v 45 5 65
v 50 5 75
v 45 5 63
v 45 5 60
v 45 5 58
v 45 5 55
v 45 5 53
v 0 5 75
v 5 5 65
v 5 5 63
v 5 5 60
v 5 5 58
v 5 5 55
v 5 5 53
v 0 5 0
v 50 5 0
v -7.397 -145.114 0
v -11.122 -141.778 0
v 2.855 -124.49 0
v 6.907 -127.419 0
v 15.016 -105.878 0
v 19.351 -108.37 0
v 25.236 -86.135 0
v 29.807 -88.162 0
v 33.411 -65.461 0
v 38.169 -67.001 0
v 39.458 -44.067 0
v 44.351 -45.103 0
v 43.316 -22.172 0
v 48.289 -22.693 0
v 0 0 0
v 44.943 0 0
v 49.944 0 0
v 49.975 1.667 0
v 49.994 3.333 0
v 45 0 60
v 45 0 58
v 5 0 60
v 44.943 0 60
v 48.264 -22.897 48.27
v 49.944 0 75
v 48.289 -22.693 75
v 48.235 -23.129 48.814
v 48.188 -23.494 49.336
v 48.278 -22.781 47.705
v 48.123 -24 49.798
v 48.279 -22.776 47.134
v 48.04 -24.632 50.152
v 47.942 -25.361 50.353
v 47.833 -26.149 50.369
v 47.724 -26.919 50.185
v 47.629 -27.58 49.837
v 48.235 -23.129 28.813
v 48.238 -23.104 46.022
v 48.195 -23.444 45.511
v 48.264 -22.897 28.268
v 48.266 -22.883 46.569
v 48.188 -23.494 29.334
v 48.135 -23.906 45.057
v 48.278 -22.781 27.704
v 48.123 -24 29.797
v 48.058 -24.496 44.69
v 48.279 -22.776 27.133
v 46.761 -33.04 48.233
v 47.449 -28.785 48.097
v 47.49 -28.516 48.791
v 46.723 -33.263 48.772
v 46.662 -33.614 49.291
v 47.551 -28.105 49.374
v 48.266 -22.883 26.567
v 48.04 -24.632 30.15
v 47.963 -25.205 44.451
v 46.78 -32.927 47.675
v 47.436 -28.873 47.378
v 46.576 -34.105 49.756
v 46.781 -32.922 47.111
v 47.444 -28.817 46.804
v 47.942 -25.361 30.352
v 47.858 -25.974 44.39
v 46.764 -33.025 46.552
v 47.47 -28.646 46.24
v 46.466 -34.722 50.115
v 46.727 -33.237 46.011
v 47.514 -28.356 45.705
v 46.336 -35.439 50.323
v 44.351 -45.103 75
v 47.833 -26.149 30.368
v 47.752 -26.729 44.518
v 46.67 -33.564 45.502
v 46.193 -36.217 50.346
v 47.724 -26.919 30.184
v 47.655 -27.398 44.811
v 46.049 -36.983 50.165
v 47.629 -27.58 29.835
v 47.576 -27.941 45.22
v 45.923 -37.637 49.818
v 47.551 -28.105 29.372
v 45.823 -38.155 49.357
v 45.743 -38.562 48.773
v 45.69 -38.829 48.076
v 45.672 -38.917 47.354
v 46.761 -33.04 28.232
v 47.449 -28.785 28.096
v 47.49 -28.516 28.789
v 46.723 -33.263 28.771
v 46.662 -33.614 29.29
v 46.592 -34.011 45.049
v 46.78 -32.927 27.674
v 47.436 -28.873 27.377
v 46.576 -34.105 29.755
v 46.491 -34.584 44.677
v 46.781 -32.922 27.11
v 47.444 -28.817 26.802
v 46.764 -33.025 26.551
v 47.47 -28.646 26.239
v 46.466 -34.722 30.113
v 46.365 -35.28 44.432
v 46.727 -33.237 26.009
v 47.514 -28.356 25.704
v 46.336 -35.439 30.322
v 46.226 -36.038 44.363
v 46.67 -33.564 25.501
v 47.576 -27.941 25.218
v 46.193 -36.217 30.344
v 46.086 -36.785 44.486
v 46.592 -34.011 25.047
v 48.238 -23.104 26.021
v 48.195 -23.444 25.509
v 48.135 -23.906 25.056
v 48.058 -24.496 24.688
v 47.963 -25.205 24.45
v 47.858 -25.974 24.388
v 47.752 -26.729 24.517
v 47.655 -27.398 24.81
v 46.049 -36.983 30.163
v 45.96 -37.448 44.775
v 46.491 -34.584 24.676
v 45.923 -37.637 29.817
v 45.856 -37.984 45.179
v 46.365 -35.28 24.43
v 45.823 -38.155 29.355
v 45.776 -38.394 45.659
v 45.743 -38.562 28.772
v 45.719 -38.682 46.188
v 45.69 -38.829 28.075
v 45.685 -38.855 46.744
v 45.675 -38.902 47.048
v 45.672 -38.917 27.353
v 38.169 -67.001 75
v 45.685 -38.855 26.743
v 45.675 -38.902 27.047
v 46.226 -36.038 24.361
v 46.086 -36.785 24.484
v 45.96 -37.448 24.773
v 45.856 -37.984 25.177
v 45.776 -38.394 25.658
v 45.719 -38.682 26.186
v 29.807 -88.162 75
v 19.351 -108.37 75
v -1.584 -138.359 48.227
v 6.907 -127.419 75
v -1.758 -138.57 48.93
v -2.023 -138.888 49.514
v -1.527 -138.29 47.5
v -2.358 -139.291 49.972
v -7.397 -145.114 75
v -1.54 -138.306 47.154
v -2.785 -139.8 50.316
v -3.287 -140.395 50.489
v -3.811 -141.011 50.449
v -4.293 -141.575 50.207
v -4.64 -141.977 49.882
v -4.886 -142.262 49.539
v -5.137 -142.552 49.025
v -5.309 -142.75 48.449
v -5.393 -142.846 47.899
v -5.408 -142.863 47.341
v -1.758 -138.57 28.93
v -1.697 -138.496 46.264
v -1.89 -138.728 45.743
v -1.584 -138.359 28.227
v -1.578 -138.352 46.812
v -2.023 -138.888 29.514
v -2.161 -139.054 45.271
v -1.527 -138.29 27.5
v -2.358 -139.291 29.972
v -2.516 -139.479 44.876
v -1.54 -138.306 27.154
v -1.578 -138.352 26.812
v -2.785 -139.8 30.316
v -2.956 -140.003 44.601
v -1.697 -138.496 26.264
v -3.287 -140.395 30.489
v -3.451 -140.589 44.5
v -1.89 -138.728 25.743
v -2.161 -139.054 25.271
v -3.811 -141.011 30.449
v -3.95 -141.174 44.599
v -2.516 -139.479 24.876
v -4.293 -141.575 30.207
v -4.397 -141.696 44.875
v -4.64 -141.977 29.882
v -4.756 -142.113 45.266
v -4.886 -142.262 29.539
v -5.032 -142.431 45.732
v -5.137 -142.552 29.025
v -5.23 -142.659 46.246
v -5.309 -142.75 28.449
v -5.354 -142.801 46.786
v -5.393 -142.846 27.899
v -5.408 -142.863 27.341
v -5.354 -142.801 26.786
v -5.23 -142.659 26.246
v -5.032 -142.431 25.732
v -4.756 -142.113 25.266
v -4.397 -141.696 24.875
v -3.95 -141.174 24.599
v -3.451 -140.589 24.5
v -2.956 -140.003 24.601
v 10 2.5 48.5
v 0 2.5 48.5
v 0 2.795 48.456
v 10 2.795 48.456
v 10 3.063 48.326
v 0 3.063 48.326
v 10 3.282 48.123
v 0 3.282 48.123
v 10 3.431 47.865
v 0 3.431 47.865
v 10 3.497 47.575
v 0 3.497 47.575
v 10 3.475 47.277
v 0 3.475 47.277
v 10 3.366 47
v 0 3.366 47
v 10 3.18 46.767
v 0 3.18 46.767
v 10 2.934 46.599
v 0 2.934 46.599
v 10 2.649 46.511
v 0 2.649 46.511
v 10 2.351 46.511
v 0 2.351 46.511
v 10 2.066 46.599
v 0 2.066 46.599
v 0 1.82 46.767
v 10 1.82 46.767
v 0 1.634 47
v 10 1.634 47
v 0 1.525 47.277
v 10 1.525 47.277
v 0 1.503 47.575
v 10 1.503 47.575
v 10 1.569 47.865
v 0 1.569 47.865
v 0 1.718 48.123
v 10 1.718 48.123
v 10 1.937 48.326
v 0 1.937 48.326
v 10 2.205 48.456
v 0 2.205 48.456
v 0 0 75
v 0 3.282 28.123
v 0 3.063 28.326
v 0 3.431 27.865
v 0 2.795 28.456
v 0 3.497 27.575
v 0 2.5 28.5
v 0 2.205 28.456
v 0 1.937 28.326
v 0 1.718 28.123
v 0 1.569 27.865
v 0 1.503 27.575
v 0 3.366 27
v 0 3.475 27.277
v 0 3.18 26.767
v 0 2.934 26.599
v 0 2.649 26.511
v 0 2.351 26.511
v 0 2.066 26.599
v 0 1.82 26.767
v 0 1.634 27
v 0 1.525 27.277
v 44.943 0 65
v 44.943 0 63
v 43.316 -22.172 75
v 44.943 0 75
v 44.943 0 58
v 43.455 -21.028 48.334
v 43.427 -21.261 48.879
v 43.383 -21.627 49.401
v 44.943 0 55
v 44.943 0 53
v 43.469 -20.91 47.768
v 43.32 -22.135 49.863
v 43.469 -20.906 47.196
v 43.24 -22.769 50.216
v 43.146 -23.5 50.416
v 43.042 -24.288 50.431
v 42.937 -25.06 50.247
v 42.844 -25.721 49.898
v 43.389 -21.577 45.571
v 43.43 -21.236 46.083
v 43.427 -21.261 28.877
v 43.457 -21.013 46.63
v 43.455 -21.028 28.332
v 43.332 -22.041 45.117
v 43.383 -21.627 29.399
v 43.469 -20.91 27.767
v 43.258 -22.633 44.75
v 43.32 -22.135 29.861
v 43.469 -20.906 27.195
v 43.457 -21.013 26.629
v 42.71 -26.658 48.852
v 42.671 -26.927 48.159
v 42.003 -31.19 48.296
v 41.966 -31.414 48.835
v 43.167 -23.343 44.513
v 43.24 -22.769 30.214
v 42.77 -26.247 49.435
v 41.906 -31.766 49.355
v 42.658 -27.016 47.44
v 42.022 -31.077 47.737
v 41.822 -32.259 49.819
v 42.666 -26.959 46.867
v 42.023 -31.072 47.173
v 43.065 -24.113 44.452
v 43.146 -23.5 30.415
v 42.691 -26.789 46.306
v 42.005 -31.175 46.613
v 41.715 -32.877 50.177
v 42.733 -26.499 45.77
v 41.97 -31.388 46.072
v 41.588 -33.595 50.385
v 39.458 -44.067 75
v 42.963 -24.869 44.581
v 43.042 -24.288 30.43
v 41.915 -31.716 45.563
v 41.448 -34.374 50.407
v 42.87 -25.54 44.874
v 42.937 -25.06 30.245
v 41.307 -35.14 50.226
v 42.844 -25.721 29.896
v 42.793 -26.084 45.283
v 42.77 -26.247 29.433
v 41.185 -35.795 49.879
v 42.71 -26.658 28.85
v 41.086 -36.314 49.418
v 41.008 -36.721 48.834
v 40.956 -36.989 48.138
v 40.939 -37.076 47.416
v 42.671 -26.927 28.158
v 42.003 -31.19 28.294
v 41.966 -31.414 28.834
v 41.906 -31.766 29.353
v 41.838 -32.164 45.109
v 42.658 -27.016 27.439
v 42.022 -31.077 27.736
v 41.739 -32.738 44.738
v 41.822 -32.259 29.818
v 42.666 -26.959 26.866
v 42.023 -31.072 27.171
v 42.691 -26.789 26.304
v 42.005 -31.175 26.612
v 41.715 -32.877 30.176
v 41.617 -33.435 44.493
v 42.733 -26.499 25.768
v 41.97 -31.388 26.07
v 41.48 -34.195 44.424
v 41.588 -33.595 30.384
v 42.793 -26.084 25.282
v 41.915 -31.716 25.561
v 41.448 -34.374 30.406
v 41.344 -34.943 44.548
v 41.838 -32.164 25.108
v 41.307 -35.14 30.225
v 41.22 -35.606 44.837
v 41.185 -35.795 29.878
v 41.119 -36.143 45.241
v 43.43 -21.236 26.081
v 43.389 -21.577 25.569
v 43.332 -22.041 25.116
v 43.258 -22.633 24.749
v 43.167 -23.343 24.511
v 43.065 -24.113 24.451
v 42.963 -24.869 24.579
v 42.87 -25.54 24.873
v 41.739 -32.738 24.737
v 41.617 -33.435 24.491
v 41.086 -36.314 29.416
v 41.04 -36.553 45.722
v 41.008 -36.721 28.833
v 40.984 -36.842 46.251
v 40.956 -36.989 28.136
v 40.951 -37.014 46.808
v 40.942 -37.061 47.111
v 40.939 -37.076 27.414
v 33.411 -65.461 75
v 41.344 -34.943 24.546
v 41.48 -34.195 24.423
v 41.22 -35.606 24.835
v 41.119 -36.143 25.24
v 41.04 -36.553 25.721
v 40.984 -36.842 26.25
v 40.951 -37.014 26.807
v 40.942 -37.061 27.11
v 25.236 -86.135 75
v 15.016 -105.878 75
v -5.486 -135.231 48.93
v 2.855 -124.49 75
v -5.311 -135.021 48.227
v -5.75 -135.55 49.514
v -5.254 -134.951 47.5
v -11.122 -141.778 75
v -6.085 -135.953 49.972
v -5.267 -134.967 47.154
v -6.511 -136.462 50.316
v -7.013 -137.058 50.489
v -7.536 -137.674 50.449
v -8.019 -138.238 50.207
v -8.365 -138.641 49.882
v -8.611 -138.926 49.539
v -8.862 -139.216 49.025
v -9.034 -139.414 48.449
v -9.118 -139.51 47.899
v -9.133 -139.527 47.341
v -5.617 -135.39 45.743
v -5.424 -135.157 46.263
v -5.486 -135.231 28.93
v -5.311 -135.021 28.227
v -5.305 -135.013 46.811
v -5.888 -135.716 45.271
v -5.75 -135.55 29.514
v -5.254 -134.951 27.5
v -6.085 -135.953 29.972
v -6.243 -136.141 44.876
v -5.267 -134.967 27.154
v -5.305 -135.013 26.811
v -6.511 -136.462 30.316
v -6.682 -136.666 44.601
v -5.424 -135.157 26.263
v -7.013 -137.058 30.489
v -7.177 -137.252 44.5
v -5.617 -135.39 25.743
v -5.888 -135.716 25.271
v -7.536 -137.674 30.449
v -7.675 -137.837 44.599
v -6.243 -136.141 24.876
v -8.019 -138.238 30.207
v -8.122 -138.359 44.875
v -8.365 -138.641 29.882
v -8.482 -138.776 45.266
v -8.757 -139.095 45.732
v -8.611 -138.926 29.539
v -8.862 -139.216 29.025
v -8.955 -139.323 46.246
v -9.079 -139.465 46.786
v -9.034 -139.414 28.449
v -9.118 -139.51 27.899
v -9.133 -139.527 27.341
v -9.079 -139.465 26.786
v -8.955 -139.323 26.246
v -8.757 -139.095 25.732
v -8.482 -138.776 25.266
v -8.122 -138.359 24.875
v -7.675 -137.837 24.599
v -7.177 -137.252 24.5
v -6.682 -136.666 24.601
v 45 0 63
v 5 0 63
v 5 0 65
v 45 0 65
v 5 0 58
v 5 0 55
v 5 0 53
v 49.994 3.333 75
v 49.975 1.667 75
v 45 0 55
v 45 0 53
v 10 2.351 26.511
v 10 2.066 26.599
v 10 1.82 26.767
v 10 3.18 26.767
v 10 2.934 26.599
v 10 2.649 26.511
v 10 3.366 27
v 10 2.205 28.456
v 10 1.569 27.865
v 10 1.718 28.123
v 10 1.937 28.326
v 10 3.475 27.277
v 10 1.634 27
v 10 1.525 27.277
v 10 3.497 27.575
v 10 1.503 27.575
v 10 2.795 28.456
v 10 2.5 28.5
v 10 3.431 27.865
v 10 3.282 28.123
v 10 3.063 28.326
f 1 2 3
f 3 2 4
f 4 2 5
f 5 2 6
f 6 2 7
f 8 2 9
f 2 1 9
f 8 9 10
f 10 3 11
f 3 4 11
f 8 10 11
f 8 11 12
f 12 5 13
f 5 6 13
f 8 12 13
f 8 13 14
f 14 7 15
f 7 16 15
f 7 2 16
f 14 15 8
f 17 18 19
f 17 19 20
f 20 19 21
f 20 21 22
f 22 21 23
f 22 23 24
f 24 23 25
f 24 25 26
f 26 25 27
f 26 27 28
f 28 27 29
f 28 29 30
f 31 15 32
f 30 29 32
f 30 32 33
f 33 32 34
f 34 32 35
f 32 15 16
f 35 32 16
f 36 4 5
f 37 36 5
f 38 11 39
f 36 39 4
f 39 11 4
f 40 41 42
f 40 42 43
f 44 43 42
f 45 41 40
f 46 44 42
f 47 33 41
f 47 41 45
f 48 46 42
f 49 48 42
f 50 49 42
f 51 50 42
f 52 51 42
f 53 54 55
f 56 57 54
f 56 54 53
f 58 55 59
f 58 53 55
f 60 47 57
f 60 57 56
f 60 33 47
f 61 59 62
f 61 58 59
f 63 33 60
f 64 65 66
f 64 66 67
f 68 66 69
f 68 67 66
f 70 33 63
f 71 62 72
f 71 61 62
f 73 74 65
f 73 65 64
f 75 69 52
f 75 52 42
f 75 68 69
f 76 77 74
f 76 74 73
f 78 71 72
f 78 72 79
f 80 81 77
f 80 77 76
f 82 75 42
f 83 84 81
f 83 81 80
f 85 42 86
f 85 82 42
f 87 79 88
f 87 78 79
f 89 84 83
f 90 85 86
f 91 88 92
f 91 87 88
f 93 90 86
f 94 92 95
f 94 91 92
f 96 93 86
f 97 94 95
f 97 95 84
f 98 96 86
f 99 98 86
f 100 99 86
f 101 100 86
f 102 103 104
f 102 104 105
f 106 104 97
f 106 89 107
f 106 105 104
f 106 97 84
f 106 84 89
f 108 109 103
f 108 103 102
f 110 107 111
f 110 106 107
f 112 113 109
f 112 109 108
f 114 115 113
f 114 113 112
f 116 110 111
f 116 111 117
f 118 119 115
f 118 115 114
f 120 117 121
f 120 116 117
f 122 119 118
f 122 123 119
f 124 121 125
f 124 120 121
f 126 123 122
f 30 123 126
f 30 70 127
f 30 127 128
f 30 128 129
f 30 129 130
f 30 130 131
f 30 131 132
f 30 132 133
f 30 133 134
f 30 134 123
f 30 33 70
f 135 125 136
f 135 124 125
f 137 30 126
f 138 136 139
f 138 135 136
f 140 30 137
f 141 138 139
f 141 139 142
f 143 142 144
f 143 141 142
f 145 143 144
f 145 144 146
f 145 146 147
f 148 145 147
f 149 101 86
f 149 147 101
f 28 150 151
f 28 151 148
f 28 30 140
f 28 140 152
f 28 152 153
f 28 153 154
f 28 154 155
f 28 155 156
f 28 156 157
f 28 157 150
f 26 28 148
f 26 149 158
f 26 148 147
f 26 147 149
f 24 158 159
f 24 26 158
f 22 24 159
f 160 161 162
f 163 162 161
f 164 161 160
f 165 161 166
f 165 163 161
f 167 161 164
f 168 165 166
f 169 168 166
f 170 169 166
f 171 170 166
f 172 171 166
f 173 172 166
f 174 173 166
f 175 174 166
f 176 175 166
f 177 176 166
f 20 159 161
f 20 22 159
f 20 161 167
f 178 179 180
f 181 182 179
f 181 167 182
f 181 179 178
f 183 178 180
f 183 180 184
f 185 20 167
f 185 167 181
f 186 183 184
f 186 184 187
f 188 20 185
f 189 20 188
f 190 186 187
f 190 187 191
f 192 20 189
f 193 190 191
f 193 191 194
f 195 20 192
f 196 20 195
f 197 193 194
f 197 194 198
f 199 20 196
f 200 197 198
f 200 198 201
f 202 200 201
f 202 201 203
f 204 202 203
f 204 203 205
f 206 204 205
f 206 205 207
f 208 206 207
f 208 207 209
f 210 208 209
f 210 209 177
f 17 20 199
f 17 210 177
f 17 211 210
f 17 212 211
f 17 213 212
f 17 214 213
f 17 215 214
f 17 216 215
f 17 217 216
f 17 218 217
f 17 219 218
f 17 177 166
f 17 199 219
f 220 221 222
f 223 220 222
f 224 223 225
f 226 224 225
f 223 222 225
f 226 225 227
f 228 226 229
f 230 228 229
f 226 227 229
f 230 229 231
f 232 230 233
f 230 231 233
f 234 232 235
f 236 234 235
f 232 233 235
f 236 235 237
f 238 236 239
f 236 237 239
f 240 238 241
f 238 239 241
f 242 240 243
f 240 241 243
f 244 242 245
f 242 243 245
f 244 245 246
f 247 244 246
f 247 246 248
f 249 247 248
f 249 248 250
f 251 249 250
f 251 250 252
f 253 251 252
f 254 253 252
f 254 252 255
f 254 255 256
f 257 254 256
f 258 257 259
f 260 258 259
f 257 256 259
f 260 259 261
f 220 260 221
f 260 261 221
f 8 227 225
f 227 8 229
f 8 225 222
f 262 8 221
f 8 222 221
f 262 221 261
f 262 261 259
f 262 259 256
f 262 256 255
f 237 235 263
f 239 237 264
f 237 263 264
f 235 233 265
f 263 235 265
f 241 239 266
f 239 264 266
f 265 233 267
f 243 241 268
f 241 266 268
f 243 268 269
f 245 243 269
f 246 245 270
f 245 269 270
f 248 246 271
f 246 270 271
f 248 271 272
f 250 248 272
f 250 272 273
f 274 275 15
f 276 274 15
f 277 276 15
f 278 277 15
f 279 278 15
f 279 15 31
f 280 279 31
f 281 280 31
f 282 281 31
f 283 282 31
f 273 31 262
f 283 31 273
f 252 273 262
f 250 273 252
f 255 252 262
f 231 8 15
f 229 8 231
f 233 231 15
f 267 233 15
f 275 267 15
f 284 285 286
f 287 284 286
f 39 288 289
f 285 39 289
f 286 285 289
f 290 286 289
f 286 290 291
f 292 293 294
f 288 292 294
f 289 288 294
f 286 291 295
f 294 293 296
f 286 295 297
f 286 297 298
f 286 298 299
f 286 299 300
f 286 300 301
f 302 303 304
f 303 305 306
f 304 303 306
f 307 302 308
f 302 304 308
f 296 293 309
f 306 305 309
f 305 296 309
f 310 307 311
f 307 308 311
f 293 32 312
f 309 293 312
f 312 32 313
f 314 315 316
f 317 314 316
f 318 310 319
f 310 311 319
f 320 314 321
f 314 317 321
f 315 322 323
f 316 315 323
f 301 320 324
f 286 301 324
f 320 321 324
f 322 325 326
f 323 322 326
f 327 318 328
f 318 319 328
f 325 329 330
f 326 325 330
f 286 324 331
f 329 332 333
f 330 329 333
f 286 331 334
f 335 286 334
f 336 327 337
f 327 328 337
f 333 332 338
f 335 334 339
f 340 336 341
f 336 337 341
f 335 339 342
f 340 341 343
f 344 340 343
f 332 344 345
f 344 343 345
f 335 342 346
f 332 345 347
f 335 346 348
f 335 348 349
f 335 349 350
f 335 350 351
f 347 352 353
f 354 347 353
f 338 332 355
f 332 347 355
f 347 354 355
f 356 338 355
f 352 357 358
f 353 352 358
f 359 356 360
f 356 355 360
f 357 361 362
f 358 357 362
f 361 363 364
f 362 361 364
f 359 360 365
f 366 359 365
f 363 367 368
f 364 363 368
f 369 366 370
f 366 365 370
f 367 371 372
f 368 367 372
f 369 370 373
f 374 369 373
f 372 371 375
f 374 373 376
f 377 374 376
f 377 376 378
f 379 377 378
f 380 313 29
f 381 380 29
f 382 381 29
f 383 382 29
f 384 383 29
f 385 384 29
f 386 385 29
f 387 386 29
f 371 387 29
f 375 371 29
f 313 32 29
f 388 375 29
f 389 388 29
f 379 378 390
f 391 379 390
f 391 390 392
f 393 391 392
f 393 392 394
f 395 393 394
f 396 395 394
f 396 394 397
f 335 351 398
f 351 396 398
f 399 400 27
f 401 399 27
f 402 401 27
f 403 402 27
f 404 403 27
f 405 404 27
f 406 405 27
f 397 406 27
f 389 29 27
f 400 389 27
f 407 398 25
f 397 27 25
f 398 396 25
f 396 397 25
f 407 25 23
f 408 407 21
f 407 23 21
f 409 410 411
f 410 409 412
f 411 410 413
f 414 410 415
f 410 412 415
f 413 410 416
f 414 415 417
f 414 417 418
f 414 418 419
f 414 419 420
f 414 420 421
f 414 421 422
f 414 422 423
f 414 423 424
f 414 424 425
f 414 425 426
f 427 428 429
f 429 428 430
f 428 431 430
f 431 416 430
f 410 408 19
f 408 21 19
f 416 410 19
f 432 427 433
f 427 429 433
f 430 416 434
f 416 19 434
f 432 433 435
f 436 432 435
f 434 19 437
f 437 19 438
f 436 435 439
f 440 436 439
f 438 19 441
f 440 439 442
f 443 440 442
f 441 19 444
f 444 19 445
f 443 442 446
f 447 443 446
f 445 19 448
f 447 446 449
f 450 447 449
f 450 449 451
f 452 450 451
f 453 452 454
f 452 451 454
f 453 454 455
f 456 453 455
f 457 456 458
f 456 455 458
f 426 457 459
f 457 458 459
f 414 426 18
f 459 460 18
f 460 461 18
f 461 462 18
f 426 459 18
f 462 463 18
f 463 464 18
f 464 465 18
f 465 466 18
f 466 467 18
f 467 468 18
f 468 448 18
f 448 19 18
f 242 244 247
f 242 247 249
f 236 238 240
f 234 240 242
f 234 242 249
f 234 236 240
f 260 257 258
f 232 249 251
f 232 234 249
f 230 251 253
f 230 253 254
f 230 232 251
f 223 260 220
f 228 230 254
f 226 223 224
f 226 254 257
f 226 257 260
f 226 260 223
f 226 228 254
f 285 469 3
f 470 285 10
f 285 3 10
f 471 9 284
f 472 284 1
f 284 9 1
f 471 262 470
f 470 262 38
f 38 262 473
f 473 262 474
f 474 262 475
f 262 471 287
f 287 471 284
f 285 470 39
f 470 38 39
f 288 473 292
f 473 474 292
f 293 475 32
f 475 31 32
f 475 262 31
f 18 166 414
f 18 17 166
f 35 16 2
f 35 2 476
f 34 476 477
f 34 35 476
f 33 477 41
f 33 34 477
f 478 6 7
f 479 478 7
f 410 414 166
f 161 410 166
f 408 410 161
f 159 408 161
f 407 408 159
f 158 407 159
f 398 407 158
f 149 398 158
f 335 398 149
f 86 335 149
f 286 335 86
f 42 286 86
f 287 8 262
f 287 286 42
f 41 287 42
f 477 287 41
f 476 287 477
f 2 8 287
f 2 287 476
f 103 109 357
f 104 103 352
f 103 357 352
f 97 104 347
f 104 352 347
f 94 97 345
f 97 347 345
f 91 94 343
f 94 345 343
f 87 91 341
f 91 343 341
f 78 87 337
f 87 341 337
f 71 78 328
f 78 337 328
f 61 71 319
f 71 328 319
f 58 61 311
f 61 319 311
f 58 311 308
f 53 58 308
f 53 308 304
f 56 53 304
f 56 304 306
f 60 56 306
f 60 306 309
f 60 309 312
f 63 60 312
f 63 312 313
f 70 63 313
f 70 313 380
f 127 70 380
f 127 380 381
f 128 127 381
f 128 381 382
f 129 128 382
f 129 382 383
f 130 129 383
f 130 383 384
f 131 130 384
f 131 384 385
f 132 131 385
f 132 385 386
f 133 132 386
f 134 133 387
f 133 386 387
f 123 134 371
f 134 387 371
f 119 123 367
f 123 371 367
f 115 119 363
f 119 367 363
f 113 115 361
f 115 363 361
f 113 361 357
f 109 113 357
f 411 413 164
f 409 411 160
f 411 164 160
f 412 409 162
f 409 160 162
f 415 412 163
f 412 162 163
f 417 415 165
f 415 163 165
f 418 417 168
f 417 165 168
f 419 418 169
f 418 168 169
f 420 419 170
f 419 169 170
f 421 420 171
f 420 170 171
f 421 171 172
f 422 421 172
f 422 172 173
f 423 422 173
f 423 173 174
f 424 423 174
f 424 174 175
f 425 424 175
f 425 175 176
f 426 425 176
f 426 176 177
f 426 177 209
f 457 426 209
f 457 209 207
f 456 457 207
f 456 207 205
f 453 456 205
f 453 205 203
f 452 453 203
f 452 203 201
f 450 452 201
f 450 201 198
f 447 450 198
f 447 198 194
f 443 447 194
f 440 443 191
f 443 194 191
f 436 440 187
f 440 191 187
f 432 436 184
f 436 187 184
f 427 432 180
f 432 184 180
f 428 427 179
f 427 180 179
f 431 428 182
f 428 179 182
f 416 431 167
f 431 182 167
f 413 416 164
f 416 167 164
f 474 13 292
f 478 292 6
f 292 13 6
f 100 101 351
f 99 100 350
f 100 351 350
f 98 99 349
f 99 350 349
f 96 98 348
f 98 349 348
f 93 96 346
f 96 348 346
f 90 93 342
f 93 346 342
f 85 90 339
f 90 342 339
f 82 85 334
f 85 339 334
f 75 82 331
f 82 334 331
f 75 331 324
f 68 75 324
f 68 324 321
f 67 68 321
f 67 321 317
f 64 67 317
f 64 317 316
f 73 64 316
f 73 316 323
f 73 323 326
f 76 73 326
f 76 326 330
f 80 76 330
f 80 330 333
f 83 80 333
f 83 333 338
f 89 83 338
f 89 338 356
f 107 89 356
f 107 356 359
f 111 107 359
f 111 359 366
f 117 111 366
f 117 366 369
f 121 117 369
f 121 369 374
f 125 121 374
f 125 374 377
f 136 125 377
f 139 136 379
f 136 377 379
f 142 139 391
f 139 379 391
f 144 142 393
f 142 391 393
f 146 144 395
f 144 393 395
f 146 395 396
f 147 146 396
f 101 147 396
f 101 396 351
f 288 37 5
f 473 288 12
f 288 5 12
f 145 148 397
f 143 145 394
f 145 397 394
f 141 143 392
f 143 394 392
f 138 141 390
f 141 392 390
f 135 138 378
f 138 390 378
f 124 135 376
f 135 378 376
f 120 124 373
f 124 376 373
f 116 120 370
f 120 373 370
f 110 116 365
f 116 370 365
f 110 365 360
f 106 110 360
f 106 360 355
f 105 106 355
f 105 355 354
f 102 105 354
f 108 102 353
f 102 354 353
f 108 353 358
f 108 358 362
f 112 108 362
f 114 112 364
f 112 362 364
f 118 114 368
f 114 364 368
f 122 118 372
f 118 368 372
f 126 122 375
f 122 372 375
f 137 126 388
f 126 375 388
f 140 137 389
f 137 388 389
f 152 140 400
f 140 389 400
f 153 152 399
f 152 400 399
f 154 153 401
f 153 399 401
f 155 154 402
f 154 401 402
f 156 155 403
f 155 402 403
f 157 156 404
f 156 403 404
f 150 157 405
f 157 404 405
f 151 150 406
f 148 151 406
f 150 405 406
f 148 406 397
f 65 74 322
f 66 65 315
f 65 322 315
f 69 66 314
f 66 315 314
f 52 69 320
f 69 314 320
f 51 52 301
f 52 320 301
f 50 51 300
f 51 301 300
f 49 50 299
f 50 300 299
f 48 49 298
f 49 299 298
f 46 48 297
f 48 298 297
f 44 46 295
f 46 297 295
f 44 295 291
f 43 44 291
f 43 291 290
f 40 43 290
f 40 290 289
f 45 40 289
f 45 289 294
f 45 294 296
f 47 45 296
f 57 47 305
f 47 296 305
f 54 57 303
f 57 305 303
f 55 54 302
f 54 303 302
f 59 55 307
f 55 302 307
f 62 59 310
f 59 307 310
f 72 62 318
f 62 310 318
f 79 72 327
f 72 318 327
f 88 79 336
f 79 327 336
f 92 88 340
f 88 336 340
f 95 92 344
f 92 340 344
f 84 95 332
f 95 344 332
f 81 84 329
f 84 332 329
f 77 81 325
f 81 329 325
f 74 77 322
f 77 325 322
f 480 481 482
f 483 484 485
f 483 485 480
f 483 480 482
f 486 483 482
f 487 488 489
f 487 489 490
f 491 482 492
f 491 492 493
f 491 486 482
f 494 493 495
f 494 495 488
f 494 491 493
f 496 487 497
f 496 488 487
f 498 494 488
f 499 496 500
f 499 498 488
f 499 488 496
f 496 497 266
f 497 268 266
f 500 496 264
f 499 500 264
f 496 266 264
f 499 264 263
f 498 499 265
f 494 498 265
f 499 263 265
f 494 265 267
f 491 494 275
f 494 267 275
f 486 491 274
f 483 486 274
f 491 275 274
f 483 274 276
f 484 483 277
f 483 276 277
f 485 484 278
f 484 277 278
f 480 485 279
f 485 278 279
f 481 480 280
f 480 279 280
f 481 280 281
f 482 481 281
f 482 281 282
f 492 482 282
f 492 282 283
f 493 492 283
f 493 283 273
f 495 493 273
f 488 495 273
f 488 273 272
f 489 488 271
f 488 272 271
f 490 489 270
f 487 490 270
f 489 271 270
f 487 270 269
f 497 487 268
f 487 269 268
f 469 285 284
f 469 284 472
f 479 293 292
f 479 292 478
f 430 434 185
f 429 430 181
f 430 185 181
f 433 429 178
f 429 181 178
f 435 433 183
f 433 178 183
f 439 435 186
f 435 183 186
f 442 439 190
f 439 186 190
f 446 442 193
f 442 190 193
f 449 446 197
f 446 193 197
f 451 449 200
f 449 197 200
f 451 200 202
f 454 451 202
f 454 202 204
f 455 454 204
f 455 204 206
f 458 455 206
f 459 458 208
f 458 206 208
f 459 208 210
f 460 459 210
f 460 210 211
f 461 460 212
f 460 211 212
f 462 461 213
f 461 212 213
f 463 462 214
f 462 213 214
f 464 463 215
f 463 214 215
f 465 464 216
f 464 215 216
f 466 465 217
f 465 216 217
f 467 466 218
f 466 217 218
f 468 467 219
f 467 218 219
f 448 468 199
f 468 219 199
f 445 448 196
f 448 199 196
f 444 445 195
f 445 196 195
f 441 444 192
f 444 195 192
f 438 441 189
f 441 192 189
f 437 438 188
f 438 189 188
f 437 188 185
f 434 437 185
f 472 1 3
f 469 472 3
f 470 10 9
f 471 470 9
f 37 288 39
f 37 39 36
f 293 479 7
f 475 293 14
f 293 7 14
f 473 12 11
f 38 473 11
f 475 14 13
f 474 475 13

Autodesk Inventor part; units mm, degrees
ref_plane "YZ Plane" through (0, 0, 0) normal (1, 0, 0) x (0, 1, 0)
sketch "Sketch1" plane through (0, 0, 0) normal (0, 0, 1) x (1, 0, 0)
  line L0 (0, 0) -> (50, 0)
  line L1 (50, 0) -> (50, 5)
  line L2 (50, 5) -> (0, 5)
  line L3 (0, 5) -> (0, 0)
  dimension "d0" = 50
  dimension "d1" = 5
extrude "Extrusion1" add sketch "Sketch1" along normal blind 75
sketch "Sketch2" plane through (0, 0, 0) normal (-1, 0, 0) x (0, 0, 1)
  circle A0 centre (47.5, 2.5) radius 1
  circle A1 centre (27.5, 2.5) radius 1
  line L0 (0, 5) -> (0, 0) projected
  line L1 (0, 0) -> (75, 0) projected
  dimension "d4" = 2
  dimension "d5" = 2
  dimension "d6" = 27.5
  dimension "d7" = 20
  dimension "d8" = 2.5
extrude "Extrusion2" cut sketch "Sketch2" against normal blind 10
thread "Thread1" size "M2x0.4" class "6H" standard "ANSI Metric M Profile" full length
thread "Thread2" size "M2x0.4" class "6H" standard "ANSI Metric M Profile" full length
sketch "Sketch6" plane through (0, 0, 0) normal (0, 0, 1) x (1, 0, 0)
  circle A0 centre (-175, 5) radius 225 construction
  line L0 (-7.3973, 5.2329) -> (-7.3973, -145.1144) construction
  line L1 (-176.0104, 5) -> (50, 5) construction
  circle A1 centre (-175, 5) radius 220 construction
  arc A2 (-7.3973, -145.1144) -> (50, 5) centre (-175, 5) ccw
  line L2 (-7.3973, -145.1144) -> (-11.1218, -141.7785)
  arc A3 (-11.1218, -141.7785) -> (45, 5) centre (-175, 5) ccw
  line L3 (0, 5) -> (50, 5)
  line L4 (45, 5) -> (50, 5)
  point P0 (0, 5)
  dimension "d36" = 450
  dimension "d38" = 5
  dimension "d39" = 5
  dimension "d69" = 150.1144
extrude "Extrusion5" add sketch "Sketch6" along normal blind 75
ref_plane "Work Plane3" through (50, 2.5, 0) normal (-0.932, 0.3624, 0.0121) x (-0.3624, -0.932, 0)
sketch "Sketch7" plane through (50, 2.5, 0) normal (-0.932, 0.3624, 0.0121) x (-0.3624, -0.932, 0)
  circle A0 centre (27.1699, 27.4836) radius 3
  circle A1 centre (27.1699, 47.4836) radius 3
  line L0 (-2.3301, -0.0109) -> (-2.3301, 74.9836) projected
  circle A2 centre (37.1699, 27.4836) radius 3
  circle A3 centre (37.1699, 47.4836) radius 3
  point P0 (20.4501, -0.552)
  dimension "d42" = 6
  dimension "d43" = 6
  dimension "d44" = 29.5
  dimension "d46" = 20
  dimension "d47" = 27.5
  dimension "d48" = 6
  dimension "d49" = 6
  dimension "d50" = 10
extrude "Extrusion6" cut sketch "Sketch7" along normal through all both and the other way through all
sketch "Sketch8" plane through (0, 5, 0) normal (0, 1, 0) x (1, 0, 0)
  line L0 (5, -65) -> (45, -65)
  line L1 (45, -65) -> (45, -63)
  line L2 (45, -63) -> (5, -63)
  line L3 (5, -63) -> (5, -65)
  line L4 (50, 0) -> (0, 0) projected
  line L5 (0, 0) -> (0, -75) projected
  line L6 (50, -75) -> (0, -75) projected
  line L7 (50, 0) -> (50, -75) projected
  line L8 (45, -58) -> (5, -58)
  line L9 (5, -58) -> (5, -60)
  line L10 (5, -60) -> (45, -60)
  line L11 (45, -60) -> (45, -58)
  line L12 (45, -53) -> (5, -53)
  line L13 (5, -53) -> (5, -55)
  line L14 (5, -55) -> (45, -55)
  line L15 (45, -55) -> (45, -53)
  dimension "d56" = 40
  dimension "d57" = 2
  dimension "d58" = 5
  dimension "d59" = 10
  dimension "d62" = 5
extrude "Extrusion7" cut sketch "Sketch8" against normal blind 5 contours L3 L2 L1 L0 | L11 L10 L9 L8 | L15 L14 L13 L12
ref_plane "Work Plane4" through (-7.3973, -145.1144, 0) normal (0.7449, -0.6672, 0) x (0.6672, 0.7449, 0)
sketch "Sketch9" plane through (-7.3973, -145.1144, 0) normal (0.7449, -0.6672, 0) x (0.6672, 0.7449, 0)
  circle A0 centre (6, 27.5) radius 3
  circle A1 centre (6, 47.5) radius 3
  line L0 (146.3528, 75) -> (0, 75) projected
  line L1 (0, 0) -> (0, 75) projected
  point P0 (113.0311, 0)
  dimension "d70" = 6
  dimension "d71" = 6
  dimension "d72" = 27.5
  dimension "d73" = 20
  dimension "d74" = 6
extrude "Extrusion8" cut sketch "Sketch9" along normal through all both and the other way through all
sketch "Sketch10" plane through (0, 0, 0) normal (0, 0, -1) x (-1, 0, 0)
  circle A0 centre (175, 5) radius 225
  circle A1 centre (175, 5) radius 230
  point P0 (-49.9444, 0)
  point P1 (-50, 5)
  dimension "d77" = 450
  dimension "d78" = 5
extrude "Extrusion9" cut sketch "Sketch10" against normal through all
properties part number "CW002" material "ABS Plastic"
